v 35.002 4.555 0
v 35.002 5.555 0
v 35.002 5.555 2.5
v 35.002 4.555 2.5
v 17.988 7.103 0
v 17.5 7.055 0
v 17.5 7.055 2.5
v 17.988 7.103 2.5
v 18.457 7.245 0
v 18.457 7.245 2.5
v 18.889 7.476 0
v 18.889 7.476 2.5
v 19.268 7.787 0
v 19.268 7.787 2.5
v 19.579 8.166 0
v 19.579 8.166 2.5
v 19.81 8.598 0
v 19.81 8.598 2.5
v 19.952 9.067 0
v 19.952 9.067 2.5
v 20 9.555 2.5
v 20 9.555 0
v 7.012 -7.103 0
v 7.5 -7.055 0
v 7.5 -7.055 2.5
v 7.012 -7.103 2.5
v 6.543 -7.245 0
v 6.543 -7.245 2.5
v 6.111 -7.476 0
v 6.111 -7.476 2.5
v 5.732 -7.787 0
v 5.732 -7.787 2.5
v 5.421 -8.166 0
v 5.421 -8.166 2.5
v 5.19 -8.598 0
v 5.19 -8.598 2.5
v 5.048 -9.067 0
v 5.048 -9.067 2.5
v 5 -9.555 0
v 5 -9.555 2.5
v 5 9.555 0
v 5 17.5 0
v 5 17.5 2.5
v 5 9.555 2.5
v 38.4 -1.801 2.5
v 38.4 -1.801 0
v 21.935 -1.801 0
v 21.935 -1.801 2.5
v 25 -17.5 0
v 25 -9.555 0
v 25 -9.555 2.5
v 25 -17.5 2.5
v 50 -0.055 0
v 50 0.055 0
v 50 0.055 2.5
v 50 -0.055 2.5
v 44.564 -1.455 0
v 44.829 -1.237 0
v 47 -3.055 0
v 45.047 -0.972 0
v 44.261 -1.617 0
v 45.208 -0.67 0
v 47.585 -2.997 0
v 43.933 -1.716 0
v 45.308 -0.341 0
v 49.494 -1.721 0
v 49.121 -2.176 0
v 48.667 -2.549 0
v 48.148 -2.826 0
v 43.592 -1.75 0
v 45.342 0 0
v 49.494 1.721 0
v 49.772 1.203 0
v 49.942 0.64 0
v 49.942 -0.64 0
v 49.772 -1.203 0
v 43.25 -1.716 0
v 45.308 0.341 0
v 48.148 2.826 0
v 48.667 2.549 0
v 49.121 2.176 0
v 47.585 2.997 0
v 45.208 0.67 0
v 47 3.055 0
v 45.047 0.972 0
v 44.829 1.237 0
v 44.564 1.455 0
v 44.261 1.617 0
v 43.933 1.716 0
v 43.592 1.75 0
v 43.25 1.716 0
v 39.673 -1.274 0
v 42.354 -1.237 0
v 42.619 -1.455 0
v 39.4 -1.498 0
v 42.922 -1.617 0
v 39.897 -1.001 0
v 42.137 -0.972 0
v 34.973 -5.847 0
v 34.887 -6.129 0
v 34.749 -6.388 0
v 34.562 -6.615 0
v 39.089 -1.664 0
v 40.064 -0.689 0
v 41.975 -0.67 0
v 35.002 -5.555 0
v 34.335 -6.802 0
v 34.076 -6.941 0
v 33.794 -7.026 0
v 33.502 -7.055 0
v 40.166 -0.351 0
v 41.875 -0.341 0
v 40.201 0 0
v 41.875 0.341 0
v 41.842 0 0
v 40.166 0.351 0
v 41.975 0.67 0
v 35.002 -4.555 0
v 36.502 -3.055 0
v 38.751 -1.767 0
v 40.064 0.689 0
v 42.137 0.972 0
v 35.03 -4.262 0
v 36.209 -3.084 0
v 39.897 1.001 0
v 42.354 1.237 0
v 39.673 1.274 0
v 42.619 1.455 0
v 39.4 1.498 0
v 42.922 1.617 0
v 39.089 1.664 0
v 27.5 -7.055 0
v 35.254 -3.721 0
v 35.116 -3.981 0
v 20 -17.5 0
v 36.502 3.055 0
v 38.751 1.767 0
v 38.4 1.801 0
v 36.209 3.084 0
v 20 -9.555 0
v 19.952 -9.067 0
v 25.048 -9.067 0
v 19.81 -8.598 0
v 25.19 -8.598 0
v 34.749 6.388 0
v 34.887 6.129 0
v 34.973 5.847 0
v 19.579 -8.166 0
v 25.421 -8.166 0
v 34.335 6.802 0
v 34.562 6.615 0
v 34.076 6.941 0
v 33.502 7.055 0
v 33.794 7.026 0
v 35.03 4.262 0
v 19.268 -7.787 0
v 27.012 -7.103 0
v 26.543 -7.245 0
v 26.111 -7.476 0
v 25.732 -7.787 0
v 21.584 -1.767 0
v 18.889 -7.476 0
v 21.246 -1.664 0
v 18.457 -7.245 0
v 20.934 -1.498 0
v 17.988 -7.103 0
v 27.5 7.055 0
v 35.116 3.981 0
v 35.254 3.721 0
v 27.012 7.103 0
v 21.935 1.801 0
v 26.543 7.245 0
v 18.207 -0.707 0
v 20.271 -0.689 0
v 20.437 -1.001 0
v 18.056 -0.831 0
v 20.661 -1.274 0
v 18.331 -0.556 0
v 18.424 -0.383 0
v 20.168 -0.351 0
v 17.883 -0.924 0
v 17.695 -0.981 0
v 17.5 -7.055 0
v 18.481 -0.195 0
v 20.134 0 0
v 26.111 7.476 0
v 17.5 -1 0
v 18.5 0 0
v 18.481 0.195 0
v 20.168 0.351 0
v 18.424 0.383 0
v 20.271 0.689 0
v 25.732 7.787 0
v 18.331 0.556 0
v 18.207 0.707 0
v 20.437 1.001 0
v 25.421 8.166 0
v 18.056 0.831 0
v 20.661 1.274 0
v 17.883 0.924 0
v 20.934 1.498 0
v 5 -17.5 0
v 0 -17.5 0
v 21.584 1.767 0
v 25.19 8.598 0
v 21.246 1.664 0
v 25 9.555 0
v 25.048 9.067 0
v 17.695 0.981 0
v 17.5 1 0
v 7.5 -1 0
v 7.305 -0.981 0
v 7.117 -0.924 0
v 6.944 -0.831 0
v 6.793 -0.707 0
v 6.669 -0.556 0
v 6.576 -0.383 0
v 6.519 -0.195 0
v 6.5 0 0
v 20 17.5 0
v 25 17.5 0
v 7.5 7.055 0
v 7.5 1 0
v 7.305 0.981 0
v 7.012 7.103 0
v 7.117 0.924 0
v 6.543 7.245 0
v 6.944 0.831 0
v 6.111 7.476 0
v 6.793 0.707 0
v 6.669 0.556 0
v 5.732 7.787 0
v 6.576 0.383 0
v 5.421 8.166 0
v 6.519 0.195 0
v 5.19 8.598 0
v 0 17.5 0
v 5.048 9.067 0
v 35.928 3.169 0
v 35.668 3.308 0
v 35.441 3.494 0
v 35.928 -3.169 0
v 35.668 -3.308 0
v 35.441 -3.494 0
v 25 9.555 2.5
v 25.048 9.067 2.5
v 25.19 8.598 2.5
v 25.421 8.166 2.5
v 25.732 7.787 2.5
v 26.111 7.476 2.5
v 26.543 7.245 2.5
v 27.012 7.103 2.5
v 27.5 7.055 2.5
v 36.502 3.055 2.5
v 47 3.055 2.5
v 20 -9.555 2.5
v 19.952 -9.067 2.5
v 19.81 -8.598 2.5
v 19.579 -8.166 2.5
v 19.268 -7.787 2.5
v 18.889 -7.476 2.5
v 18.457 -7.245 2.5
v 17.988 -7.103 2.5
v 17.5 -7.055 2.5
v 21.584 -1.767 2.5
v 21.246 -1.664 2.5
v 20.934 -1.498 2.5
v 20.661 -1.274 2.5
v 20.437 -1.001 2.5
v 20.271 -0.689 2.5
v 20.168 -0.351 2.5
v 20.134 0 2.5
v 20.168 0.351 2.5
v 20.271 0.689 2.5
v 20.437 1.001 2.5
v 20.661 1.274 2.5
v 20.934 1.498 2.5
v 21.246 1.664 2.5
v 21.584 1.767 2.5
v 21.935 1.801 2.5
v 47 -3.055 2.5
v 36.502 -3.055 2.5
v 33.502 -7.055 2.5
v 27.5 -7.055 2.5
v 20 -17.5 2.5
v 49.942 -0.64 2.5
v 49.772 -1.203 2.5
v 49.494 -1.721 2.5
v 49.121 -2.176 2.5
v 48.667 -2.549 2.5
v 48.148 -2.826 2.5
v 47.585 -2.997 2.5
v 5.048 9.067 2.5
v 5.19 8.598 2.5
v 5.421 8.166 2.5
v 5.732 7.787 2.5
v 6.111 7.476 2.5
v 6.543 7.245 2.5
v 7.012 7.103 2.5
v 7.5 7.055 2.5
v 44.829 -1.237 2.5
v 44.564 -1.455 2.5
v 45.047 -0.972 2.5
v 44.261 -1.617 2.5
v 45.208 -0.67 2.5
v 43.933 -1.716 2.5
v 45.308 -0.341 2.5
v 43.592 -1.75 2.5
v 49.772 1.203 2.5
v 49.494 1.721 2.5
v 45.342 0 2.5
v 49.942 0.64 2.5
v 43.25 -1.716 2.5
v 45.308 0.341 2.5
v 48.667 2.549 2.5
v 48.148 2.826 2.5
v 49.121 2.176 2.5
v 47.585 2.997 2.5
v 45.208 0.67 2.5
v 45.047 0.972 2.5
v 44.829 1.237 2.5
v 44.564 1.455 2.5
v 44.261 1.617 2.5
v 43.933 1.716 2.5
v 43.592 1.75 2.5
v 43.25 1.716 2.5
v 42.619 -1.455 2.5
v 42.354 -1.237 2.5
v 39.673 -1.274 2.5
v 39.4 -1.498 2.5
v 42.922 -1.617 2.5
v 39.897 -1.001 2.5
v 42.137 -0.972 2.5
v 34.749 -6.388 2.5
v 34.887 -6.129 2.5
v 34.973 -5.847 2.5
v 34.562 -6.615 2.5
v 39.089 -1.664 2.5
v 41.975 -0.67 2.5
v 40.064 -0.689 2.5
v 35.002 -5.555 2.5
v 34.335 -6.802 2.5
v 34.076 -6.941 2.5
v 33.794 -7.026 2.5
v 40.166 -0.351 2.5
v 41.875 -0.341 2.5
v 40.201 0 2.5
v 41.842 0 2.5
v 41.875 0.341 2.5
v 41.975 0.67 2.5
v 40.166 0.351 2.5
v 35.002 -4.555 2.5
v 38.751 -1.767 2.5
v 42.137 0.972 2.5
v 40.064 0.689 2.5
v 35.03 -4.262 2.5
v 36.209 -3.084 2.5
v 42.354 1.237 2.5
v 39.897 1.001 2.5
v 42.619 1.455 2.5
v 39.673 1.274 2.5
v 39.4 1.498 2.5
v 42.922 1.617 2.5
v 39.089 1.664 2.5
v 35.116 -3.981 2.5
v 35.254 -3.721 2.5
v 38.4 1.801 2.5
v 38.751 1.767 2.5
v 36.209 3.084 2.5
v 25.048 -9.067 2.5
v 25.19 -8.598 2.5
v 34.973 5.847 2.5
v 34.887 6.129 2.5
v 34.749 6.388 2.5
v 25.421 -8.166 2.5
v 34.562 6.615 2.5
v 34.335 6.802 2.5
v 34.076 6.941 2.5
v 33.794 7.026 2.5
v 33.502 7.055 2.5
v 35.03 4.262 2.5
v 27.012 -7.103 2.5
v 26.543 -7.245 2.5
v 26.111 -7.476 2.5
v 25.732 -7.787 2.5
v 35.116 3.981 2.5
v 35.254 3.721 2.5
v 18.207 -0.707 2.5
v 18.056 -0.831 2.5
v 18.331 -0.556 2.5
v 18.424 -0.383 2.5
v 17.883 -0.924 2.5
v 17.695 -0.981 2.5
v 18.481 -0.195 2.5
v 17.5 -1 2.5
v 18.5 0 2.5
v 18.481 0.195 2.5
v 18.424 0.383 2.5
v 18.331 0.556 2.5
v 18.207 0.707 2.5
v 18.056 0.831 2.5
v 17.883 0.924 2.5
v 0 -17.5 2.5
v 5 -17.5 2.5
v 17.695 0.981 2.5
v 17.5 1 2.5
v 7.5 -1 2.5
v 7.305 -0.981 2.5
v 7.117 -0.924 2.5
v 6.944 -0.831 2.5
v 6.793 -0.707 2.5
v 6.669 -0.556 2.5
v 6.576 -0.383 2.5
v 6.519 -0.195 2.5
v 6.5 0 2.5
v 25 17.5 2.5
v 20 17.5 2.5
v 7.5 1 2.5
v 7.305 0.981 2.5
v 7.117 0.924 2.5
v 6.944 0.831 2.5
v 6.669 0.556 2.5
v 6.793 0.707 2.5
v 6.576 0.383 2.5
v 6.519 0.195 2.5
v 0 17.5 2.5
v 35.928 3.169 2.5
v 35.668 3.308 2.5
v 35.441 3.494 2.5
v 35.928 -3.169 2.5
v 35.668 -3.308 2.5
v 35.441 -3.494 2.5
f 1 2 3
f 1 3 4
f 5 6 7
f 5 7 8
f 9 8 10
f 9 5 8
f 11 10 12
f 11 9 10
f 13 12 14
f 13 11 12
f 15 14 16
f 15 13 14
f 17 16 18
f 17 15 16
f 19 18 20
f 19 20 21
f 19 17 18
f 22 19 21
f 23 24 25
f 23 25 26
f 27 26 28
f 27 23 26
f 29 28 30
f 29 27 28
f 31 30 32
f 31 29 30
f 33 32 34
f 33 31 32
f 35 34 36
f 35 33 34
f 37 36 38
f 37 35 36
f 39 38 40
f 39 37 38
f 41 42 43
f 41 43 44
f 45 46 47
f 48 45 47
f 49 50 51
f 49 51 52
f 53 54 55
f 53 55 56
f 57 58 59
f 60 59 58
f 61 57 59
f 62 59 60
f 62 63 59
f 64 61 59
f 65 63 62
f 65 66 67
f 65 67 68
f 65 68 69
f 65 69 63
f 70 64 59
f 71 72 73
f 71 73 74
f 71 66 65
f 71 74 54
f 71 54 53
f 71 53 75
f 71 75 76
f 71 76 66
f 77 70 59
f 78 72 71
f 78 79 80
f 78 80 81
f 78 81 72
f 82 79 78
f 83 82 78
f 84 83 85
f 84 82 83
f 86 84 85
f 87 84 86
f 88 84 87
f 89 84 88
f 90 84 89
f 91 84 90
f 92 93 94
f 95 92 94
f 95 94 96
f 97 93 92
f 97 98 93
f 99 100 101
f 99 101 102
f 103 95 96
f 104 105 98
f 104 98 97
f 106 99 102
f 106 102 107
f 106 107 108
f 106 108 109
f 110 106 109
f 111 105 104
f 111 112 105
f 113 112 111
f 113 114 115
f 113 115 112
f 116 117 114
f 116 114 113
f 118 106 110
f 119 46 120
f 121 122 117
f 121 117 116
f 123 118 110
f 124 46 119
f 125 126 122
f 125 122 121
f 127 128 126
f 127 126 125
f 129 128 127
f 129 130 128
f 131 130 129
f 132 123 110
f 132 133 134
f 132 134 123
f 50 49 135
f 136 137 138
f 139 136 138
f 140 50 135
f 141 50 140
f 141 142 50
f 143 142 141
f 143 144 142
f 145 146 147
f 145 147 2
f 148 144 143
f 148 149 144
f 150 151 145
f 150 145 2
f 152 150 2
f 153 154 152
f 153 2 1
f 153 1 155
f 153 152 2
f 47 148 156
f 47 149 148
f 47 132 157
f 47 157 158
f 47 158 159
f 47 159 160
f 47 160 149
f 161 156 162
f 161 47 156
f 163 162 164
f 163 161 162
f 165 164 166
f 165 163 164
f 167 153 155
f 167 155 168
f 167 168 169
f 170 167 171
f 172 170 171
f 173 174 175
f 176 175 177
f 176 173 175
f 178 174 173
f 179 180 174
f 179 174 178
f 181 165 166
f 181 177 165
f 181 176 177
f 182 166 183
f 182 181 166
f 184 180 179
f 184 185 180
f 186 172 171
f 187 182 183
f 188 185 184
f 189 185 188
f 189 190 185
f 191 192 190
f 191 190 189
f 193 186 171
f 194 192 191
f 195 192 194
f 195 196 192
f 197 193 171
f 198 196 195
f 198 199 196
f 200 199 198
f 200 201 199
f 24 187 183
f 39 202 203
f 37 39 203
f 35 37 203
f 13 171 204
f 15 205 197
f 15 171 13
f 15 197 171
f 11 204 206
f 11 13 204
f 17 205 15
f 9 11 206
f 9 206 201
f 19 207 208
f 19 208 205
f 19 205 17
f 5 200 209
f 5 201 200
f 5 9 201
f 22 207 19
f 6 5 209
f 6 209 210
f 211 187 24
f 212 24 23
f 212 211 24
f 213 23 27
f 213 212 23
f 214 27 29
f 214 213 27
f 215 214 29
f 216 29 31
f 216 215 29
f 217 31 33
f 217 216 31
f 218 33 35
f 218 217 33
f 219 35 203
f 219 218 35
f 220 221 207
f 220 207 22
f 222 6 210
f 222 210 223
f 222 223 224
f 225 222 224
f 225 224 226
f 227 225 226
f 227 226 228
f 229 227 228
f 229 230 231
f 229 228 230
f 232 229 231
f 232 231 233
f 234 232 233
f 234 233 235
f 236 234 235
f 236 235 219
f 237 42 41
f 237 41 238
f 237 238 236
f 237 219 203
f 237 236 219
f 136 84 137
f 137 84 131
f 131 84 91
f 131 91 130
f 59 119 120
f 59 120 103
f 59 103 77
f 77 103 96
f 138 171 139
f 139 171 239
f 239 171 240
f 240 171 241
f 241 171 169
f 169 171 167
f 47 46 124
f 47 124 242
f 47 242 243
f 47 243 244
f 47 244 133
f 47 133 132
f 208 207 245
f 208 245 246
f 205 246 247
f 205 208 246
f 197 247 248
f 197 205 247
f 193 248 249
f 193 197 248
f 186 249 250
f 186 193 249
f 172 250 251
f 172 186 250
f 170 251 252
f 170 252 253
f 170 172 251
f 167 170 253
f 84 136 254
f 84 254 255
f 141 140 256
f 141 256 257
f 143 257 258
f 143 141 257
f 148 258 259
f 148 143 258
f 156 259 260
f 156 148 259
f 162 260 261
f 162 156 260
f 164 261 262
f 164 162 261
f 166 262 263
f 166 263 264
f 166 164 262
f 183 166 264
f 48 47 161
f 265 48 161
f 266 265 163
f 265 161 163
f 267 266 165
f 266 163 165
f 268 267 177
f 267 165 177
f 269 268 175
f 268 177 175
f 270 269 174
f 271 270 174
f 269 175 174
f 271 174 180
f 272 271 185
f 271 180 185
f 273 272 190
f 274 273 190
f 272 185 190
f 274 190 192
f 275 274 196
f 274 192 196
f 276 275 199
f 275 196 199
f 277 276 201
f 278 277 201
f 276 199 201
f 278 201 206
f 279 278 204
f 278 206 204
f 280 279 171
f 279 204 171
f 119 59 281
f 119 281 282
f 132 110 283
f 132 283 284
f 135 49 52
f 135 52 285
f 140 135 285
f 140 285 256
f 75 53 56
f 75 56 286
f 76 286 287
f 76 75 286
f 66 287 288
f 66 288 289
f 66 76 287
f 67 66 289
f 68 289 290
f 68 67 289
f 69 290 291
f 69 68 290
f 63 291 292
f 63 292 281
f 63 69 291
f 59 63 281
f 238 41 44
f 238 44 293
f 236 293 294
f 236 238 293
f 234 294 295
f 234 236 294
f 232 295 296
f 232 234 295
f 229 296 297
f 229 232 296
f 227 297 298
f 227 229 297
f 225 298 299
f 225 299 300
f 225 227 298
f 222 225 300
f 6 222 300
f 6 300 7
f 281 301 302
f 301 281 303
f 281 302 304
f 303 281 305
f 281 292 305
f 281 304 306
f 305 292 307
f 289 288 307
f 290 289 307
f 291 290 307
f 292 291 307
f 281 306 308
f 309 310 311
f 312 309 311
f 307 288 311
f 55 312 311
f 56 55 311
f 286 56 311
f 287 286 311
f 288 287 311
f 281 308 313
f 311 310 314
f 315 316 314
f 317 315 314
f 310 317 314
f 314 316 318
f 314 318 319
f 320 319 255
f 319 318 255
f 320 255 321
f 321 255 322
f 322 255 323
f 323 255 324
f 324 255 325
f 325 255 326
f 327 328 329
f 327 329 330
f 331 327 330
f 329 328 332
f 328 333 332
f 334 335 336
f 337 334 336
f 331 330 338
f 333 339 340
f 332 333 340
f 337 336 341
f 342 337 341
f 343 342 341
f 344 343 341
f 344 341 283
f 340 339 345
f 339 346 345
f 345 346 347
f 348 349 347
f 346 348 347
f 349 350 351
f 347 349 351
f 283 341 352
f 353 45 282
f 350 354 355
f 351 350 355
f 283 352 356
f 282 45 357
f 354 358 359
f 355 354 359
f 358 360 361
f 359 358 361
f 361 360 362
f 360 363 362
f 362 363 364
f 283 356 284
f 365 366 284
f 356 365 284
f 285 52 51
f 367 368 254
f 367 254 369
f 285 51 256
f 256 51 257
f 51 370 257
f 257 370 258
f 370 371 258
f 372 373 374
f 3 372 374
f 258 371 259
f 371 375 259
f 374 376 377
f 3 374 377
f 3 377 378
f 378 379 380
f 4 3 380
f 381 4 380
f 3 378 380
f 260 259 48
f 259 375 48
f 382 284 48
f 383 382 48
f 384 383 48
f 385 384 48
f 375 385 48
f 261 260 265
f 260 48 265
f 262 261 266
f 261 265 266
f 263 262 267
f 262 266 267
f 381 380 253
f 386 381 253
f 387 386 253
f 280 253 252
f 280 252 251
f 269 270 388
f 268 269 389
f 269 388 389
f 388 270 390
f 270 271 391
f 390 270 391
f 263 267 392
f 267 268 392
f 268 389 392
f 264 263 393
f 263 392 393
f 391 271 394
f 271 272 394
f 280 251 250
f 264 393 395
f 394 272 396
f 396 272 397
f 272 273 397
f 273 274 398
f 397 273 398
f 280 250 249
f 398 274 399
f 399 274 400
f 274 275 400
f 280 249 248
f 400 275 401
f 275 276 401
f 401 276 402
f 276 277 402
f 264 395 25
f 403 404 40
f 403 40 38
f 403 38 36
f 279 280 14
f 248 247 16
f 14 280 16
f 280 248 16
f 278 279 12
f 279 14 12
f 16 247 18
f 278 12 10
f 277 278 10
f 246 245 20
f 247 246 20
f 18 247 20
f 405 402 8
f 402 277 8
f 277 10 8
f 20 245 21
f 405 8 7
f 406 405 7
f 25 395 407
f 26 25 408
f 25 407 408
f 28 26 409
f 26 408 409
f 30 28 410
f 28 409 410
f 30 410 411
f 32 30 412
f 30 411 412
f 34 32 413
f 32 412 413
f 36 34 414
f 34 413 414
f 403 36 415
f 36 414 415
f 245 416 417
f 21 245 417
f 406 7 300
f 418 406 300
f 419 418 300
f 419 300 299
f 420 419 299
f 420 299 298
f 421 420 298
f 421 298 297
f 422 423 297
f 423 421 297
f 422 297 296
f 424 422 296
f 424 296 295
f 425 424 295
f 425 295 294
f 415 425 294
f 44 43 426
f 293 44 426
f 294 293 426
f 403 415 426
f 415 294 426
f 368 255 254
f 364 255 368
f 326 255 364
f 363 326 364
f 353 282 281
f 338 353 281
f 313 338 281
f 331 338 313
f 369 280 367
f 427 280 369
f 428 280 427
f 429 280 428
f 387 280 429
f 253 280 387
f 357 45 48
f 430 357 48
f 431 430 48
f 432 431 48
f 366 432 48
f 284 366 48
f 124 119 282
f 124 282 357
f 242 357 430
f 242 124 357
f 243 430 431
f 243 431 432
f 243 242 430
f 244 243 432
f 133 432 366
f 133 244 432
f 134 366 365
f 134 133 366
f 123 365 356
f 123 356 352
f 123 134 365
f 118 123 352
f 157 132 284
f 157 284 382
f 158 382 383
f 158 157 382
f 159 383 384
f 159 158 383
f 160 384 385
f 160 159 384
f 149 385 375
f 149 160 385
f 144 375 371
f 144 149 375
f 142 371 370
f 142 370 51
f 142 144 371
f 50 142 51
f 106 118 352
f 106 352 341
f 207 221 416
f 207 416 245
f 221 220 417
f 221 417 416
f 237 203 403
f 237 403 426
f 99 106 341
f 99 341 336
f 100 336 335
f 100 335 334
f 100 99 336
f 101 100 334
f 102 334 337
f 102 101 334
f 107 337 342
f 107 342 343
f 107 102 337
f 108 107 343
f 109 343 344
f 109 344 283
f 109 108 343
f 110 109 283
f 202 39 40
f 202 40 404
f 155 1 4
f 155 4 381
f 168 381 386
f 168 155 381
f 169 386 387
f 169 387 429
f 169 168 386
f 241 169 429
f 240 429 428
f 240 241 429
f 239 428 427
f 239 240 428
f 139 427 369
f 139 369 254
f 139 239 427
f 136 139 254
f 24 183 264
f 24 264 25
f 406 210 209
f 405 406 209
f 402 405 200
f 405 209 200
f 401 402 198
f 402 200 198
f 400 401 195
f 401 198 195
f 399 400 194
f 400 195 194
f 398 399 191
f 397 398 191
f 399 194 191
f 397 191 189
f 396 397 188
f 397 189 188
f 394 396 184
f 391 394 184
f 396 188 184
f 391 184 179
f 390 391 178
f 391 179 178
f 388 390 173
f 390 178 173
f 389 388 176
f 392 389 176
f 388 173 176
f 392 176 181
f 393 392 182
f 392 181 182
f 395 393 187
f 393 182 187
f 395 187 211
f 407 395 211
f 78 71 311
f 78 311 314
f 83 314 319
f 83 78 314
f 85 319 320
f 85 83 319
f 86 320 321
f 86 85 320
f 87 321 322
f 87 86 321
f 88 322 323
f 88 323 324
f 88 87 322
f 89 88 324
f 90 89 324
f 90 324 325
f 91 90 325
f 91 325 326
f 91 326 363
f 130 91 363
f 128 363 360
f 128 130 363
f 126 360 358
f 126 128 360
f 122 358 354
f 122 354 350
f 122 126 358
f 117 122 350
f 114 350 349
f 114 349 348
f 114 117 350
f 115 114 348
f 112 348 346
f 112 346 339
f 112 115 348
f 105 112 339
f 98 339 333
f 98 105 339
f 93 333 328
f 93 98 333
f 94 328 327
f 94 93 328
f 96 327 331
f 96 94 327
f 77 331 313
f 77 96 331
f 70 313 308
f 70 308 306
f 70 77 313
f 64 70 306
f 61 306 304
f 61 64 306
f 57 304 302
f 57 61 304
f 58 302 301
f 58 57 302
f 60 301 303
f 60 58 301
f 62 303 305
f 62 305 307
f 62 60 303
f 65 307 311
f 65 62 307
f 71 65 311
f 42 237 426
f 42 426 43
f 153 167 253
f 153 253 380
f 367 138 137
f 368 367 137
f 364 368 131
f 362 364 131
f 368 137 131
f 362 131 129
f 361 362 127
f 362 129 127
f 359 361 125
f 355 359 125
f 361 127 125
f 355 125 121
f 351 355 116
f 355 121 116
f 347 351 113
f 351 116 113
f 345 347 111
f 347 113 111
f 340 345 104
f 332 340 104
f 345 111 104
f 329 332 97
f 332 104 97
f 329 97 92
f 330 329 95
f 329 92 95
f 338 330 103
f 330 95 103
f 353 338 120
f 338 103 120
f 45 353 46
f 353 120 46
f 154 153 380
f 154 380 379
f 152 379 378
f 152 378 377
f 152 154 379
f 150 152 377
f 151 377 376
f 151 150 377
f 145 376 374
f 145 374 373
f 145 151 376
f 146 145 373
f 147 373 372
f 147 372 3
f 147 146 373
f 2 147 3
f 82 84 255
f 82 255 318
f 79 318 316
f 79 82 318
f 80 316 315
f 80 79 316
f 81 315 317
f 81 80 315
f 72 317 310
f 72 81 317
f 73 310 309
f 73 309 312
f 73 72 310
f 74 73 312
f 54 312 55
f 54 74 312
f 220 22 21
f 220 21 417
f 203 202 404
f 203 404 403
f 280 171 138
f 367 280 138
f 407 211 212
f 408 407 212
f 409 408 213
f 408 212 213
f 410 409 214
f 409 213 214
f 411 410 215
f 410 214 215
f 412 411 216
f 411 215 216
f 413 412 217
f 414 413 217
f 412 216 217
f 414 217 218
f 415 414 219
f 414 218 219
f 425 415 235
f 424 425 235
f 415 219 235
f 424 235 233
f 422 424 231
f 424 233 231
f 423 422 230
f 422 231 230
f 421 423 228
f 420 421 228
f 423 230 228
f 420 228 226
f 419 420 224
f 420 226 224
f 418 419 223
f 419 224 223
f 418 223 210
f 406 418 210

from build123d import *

# Parameters (mm, degrees)
SKETCH1_R           = 1.75
BOSS_EXTRUDE1_DEPTH = 2.5


with BuildPart() as part:
    # Sketch1 → Boss-Extrude1 (new body)
    with BuildSketch(Plane.XY):
        with BuildLine():
            Line((0, -17.5), (0, 17.5))
            Line((0, 17.5), (5, 17.5))
            Line((5, 17.5), (5, 9.554775034))
            ThreePointArc((5, 9.554775034), (5.732233047, 7.787008081), (7.5, 7.054775034))
            Line((7.5, 7.054775034), (17.5, 7.054775034))
            ThreePointArc((17.5, 7.054775034), (19.267766953, 7.787008081), (20, 9.554775034))
            Line((20, 9.554775034), (20, 17.5))
            Line((20, 17.5), (25, 17.5))
            Line((25, 17.5), (25, 9.554775034))
            ThreePointArc((25, 9.554775034), (25.732233047, 7.787008081), (27.5, 7.054775034))
            Line((27.5, 7.054775034), (33.501638743, 7.054775034))
            ThreePointArc((33.501638743, 7.054775034), (34.562298915, 6.615435205), (35.001638743, 5.554775034))
            Line((35.001638743, 5.554775034), (35.001638743, 4.554775034))
            ThreePointArc((35.001638743, 4.554775034), (35.440978571, 3.494114862), (36.501638743, 3.054775034))
            Line((36.501638743, 3.054775034), (47, 3.054775034))
            ThreePointArc((47, 3.054775034), (49.121320344, 2.176095377), (50, 0.054775034))
            Line((50, 0.054775034), (50, -0.054775034))
            ThreePointArc((50, -0.054775034), (49.121320344, -2.176095377), (47, -3.054775034))
            Line((47, -3.054775034), (36.501638743, -3.054775034))
            ThreePointArc((36.501638743, -3.054775034), (35.440978571, -3.494114862), (35.001638743, -4.554775034))
            Line((35.001638743, -4.554775034), (35.001638743, -5.554775034))
            ThreePointArc((35.001638743, -5.554775034), (34.562298915, -6.615435205), (33.501638743, -7.054775034))
            Line((33.501638743, -7.054775034), (27.5, -7.054775034))
            ThreePointArc((27.5, -7.054775034), (25.732233047, -7.787008081), (25, -9.554775034))
            Line((25, -9.554775034), (25, -17.5))
            Line((25, -17.5), (20, -17.5))
            Line((20, -17.5), (20, -9.554775034))
            ThreePointArc((20, -9.554775034), (19.267766953, -7.787008081), (17.5, -7.054775034))
            Line((17.5, -7.054775034), (7.5, -7.054775034))
            ThreePointArc((7.5, -7.054775034), (5.732233047, -7.787008081), (5, -9.554775034))
            Line((5, -9.554775034), (5, -17.5))
            Line((5, -17.5), (0, -17.5))
        make_face()
        with Locations((43.591641256, 0)):
            Circle(SKETCH1_R, mode=Mode.SUBTRACT)
        with BuildLine():
            Line((7.5, 1), (17.5, 1))
            ThreePointArc((17.5, 1), (18.5, 0), (17.5, -1))
            Line((17.5, -1), (7.5, -1))
            ThreePointArc((7.5, -1), (6.5, 0), (7.5, 1))
        make_face(mode=Mode.SUBTRACT)
        with BuildLine():
            Line((21.935113123, 1.8014467), (38.399570766, 1.8014467))
            ThreePointArc((38.399570766, 1.8014467), (40.201017466, 0), (38.399570766, -1.8014467))
            Line((38.399570766, -1.8014467), (21.935113123, -1.8014467))
            ThreePointArc((21.935113123, -1.8014467), (20.133666423, 0), (21.935113123, 1.8014467))
        make_face(mode=Mode.SUBTRACT)
    extrude(amount=BOSS_EXTRUDE1_DEPTH)


solid = part.part
